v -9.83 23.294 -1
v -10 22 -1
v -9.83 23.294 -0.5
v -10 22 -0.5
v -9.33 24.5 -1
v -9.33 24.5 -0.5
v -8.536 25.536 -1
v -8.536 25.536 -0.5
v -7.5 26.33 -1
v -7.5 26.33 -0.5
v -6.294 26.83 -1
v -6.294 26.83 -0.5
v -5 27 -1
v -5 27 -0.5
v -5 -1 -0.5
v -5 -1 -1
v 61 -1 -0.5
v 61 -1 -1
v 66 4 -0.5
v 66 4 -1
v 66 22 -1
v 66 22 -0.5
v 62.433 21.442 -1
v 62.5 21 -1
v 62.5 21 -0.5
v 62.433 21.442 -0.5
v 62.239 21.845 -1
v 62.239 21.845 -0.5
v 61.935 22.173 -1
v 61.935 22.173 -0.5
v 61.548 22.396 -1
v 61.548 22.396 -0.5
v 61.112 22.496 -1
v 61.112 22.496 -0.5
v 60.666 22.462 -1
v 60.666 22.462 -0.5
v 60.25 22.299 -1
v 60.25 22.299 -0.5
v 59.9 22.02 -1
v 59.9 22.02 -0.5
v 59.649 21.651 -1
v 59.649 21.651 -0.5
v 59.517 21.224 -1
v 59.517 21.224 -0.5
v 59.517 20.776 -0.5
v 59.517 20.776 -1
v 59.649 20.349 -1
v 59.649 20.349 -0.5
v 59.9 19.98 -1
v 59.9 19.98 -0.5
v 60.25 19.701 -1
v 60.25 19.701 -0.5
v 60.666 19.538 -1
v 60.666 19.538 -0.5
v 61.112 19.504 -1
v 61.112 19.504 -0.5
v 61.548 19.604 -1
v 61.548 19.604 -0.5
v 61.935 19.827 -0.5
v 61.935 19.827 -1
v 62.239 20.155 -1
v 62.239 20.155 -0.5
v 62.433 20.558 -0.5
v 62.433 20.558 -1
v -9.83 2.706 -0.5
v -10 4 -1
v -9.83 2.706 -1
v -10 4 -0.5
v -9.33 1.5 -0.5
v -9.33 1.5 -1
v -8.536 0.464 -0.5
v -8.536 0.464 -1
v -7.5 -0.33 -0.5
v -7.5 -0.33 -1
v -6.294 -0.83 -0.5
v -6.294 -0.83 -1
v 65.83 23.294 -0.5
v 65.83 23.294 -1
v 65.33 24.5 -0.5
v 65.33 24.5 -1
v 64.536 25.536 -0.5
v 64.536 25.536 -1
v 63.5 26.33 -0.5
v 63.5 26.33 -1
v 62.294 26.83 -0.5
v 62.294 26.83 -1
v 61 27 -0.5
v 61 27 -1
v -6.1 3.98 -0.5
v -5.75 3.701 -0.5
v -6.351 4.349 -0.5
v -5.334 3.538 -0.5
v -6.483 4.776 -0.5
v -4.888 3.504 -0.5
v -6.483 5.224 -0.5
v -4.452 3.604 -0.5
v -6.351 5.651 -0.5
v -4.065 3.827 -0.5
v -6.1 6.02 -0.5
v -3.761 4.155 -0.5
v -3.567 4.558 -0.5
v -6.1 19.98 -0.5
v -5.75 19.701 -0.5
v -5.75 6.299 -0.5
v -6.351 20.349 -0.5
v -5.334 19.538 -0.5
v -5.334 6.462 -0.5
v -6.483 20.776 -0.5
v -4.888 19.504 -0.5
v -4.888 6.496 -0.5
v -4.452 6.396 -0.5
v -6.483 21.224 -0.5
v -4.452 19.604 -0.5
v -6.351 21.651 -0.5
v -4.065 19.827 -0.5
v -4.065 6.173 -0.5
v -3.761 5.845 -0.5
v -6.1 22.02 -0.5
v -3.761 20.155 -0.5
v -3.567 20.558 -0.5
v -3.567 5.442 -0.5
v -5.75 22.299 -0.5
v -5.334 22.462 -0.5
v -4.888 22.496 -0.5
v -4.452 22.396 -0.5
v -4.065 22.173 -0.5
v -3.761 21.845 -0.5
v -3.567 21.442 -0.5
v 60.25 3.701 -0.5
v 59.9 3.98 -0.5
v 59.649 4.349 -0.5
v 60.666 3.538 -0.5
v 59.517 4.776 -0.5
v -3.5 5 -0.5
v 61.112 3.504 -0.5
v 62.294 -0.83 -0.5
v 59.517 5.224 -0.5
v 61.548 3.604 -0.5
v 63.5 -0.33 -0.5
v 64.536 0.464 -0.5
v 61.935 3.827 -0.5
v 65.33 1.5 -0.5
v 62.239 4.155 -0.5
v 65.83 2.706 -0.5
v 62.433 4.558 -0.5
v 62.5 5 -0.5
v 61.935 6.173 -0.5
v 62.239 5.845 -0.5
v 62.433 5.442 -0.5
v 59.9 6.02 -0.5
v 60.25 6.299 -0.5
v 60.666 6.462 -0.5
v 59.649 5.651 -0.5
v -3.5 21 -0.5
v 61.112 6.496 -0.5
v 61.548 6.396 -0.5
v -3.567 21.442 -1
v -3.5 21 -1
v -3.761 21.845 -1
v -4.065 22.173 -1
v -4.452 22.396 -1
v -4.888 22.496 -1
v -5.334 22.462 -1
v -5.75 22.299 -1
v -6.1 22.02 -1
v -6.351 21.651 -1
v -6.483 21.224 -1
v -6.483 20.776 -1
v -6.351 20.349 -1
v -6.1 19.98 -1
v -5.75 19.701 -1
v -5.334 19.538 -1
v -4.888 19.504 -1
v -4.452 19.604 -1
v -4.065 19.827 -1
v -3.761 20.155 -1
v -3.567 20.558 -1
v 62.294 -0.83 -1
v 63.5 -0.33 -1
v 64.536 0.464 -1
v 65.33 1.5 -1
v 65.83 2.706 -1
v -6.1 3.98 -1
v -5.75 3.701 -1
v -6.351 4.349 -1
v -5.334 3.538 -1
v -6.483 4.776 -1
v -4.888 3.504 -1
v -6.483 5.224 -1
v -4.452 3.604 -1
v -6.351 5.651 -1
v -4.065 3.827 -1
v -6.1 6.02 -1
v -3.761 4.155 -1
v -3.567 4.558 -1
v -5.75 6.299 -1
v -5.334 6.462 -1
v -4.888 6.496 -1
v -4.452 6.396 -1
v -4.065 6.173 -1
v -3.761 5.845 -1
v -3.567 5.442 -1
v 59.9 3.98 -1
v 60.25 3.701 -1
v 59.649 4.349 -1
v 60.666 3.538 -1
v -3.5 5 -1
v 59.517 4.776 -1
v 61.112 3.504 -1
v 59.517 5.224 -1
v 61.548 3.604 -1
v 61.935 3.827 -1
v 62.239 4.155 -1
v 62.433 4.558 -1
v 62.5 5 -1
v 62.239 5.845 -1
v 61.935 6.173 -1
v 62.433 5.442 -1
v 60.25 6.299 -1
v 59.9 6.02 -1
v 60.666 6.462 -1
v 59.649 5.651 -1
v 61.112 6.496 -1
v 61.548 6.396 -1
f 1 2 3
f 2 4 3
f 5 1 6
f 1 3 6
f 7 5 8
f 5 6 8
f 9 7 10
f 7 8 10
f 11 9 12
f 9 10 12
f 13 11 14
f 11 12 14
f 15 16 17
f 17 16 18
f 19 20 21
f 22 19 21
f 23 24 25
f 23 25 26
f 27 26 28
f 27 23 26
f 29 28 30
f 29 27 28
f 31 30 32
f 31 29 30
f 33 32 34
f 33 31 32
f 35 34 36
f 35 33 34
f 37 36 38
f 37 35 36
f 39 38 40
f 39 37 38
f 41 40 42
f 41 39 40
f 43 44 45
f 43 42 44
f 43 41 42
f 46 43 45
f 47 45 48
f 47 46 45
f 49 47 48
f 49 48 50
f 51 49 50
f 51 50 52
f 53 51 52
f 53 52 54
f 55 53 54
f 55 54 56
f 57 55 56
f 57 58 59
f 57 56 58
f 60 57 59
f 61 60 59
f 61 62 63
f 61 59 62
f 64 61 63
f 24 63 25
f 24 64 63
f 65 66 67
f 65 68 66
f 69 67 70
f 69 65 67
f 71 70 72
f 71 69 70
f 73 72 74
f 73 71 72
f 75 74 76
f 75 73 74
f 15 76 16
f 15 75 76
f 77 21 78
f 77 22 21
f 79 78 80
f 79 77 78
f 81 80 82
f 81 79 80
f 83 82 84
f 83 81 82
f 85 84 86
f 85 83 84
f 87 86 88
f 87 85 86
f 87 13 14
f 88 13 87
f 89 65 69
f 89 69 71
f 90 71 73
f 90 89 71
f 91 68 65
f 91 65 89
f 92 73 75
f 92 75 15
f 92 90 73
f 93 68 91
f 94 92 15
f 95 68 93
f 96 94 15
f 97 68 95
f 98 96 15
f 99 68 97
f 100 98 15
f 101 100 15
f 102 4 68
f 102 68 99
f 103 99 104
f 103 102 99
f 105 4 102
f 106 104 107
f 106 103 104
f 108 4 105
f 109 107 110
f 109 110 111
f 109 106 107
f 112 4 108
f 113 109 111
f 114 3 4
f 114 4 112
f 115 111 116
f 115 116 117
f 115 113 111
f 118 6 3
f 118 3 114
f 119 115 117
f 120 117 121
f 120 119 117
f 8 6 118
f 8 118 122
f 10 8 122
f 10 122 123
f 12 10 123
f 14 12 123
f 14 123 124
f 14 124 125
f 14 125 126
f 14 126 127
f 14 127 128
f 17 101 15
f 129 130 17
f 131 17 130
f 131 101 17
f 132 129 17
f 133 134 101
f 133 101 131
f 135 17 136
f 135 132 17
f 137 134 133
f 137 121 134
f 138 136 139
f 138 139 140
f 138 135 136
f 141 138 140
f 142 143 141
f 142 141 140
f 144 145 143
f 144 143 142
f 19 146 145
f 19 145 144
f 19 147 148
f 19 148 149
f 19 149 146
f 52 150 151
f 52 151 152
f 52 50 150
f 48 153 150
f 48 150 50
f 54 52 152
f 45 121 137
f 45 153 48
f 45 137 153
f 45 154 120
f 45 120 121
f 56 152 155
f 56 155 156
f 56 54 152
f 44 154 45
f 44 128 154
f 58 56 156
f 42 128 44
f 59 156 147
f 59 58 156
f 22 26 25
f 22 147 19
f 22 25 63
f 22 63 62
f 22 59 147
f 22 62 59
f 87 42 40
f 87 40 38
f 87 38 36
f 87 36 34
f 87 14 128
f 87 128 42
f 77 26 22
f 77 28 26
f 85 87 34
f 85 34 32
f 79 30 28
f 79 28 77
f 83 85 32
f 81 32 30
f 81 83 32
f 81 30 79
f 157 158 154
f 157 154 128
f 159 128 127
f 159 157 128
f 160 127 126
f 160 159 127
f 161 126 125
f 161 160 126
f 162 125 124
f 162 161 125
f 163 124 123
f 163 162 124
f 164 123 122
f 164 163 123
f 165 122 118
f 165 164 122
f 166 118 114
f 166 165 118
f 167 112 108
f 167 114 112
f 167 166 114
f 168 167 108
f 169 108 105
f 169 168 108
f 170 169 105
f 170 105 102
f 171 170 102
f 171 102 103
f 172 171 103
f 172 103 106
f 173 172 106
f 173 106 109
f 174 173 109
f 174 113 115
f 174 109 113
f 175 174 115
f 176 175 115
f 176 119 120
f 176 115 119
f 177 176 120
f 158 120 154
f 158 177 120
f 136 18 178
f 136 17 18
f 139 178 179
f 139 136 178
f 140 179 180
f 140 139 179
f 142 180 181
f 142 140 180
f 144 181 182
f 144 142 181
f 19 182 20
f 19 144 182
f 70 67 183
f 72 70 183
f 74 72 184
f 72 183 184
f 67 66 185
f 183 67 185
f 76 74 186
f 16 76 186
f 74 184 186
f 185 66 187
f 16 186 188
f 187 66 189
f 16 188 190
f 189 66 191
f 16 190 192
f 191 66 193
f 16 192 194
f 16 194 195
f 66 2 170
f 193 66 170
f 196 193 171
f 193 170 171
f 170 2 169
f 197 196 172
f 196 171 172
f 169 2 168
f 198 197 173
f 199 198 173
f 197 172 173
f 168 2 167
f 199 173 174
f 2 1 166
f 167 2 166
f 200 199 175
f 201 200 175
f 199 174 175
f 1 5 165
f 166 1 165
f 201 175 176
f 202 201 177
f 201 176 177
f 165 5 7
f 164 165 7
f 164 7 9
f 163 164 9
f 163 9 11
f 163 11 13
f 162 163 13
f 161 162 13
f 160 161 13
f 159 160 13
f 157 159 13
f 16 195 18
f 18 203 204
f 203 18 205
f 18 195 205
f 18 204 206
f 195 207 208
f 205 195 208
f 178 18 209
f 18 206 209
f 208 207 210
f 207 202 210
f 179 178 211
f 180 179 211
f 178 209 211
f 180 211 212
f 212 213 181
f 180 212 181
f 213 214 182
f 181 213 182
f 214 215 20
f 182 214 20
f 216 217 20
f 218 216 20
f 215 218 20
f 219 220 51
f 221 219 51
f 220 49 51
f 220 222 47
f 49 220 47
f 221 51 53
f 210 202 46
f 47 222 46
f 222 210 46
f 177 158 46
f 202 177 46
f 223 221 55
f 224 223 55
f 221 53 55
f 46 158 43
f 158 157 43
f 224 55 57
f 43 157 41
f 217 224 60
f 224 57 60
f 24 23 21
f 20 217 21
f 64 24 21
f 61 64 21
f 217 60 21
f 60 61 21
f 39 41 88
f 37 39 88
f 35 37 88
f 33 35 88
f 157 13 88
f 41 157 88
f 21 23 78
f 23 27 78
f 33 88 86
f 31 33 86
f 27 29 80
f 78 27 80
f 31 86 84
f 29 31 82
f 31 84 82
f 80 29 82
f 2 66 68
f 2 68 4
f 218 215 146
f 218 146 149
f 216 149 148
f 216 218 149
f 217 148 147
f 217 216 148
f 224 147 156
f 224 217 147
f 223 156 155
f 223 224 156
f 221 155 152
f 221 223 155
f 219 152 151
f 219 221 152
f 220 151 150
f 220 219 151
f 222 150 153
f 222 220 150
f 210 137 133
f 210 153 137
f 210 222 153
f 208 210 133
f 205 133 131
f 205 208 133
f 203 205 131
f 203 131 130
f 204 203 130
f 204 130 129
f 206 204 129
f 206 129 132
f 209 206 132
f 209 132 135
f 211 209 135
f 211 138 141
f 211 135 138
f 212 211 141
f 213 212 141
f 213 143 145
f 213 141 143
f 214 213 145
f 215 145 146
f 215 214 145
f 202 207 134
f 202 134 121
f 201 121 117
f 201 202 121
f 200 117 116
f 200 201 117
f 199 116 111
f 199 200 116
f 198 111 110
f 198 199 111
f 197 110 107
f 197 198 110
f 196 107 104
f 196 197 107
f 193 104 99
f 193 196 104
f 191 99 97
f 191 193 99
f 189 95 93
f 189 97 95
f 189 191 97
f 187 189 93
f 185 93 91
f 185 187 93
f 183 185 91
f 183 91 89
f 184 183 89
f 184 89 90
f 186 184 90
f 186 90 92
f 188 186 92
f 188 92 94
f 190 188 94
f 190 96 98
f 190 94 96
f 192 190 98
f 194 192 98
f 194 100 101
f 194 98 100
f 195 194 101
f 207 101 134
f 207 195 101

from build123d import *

# Parameters (mm, degrees)
CYLINDER001_R     = 1.5
CYLINDER001_DEPTH = 10
ARRAY001_X_COUNT  = 2
ARRAY001_X_PITCH  = 66
ARRAY001_Y_COUNT  = 2
ARRAY001_Y_PITCH  = 16
BOX002_W          = 76
BOX002_H          = 28
BOX002_DEPTH      = 0.5
FILLET001_R       = 5


with BuildPart() as screw_body_hole_array:
    # Cylinder001 → Cylinder001 (new body)
    with BuildSketch(Plane.XY):
        Circle(CYLINDER001_R)
    extrude(amount=CYLINDER001_DEPTH)

    # Array001 X: screw body hole array ×2


with BuildPart() as screw_body_hole_array_1:
    add(screw_body_hole_array.part)
    with Locations(*[(i * ARRAY001_X_PITCH, 0, 0) for i in range(1, ARRAY001_X_COUNT)]):
        add(screw_body_hole_array.part)

    # Array001 Y: screw body hole array ×2


with BuildPart() as screw_body_hole_array_2:
    add(screw_body_hole_array_1.part)
    with Locations(*[(0, i * ARRAY001_Y_PITCH, 0) for i in range(1, ARRAY001_Y_COUNT)]):
        add(screw_body_hole_array_1.part)


with BuildPart() as screw_body_hole_array_3:
    # Array001 placement: moved
    add(screw_body_hole_array_2.part.moved(Location((-5, 5, -4))))


with BuildPart() as amplifier_lid_cut:
    # Box002 → Box002 (new body)
    with BuildSketch(Plane(origin=(-10, -1, -1), x_dir=(1, 0, 0), z_dir=(0, 0, 1))):
        with Locations((38, 14)):
            Rectangle(BOX002_W, BOX002_H)
    extrude(amount=BOX002_DEPTH)

    # Fillet001
    fillet001_edges = [amplifier_lid_cut.edges().sort_by_distance(p)[0] for p in [
        (-10, -1, -0.75),
        (-10, 27, -0.75),
        (66, -1, -0.75),
        (66, 27, -0.75),
    ]]
    fillet(fillet001_edges, radius=FILLET001_R)

    # Cut001: cut screw body hole array
    add(screw_body_hole_array_3.part, mode=Mode.SUBTRACT)


solid = amplifier_lid_cut.part
